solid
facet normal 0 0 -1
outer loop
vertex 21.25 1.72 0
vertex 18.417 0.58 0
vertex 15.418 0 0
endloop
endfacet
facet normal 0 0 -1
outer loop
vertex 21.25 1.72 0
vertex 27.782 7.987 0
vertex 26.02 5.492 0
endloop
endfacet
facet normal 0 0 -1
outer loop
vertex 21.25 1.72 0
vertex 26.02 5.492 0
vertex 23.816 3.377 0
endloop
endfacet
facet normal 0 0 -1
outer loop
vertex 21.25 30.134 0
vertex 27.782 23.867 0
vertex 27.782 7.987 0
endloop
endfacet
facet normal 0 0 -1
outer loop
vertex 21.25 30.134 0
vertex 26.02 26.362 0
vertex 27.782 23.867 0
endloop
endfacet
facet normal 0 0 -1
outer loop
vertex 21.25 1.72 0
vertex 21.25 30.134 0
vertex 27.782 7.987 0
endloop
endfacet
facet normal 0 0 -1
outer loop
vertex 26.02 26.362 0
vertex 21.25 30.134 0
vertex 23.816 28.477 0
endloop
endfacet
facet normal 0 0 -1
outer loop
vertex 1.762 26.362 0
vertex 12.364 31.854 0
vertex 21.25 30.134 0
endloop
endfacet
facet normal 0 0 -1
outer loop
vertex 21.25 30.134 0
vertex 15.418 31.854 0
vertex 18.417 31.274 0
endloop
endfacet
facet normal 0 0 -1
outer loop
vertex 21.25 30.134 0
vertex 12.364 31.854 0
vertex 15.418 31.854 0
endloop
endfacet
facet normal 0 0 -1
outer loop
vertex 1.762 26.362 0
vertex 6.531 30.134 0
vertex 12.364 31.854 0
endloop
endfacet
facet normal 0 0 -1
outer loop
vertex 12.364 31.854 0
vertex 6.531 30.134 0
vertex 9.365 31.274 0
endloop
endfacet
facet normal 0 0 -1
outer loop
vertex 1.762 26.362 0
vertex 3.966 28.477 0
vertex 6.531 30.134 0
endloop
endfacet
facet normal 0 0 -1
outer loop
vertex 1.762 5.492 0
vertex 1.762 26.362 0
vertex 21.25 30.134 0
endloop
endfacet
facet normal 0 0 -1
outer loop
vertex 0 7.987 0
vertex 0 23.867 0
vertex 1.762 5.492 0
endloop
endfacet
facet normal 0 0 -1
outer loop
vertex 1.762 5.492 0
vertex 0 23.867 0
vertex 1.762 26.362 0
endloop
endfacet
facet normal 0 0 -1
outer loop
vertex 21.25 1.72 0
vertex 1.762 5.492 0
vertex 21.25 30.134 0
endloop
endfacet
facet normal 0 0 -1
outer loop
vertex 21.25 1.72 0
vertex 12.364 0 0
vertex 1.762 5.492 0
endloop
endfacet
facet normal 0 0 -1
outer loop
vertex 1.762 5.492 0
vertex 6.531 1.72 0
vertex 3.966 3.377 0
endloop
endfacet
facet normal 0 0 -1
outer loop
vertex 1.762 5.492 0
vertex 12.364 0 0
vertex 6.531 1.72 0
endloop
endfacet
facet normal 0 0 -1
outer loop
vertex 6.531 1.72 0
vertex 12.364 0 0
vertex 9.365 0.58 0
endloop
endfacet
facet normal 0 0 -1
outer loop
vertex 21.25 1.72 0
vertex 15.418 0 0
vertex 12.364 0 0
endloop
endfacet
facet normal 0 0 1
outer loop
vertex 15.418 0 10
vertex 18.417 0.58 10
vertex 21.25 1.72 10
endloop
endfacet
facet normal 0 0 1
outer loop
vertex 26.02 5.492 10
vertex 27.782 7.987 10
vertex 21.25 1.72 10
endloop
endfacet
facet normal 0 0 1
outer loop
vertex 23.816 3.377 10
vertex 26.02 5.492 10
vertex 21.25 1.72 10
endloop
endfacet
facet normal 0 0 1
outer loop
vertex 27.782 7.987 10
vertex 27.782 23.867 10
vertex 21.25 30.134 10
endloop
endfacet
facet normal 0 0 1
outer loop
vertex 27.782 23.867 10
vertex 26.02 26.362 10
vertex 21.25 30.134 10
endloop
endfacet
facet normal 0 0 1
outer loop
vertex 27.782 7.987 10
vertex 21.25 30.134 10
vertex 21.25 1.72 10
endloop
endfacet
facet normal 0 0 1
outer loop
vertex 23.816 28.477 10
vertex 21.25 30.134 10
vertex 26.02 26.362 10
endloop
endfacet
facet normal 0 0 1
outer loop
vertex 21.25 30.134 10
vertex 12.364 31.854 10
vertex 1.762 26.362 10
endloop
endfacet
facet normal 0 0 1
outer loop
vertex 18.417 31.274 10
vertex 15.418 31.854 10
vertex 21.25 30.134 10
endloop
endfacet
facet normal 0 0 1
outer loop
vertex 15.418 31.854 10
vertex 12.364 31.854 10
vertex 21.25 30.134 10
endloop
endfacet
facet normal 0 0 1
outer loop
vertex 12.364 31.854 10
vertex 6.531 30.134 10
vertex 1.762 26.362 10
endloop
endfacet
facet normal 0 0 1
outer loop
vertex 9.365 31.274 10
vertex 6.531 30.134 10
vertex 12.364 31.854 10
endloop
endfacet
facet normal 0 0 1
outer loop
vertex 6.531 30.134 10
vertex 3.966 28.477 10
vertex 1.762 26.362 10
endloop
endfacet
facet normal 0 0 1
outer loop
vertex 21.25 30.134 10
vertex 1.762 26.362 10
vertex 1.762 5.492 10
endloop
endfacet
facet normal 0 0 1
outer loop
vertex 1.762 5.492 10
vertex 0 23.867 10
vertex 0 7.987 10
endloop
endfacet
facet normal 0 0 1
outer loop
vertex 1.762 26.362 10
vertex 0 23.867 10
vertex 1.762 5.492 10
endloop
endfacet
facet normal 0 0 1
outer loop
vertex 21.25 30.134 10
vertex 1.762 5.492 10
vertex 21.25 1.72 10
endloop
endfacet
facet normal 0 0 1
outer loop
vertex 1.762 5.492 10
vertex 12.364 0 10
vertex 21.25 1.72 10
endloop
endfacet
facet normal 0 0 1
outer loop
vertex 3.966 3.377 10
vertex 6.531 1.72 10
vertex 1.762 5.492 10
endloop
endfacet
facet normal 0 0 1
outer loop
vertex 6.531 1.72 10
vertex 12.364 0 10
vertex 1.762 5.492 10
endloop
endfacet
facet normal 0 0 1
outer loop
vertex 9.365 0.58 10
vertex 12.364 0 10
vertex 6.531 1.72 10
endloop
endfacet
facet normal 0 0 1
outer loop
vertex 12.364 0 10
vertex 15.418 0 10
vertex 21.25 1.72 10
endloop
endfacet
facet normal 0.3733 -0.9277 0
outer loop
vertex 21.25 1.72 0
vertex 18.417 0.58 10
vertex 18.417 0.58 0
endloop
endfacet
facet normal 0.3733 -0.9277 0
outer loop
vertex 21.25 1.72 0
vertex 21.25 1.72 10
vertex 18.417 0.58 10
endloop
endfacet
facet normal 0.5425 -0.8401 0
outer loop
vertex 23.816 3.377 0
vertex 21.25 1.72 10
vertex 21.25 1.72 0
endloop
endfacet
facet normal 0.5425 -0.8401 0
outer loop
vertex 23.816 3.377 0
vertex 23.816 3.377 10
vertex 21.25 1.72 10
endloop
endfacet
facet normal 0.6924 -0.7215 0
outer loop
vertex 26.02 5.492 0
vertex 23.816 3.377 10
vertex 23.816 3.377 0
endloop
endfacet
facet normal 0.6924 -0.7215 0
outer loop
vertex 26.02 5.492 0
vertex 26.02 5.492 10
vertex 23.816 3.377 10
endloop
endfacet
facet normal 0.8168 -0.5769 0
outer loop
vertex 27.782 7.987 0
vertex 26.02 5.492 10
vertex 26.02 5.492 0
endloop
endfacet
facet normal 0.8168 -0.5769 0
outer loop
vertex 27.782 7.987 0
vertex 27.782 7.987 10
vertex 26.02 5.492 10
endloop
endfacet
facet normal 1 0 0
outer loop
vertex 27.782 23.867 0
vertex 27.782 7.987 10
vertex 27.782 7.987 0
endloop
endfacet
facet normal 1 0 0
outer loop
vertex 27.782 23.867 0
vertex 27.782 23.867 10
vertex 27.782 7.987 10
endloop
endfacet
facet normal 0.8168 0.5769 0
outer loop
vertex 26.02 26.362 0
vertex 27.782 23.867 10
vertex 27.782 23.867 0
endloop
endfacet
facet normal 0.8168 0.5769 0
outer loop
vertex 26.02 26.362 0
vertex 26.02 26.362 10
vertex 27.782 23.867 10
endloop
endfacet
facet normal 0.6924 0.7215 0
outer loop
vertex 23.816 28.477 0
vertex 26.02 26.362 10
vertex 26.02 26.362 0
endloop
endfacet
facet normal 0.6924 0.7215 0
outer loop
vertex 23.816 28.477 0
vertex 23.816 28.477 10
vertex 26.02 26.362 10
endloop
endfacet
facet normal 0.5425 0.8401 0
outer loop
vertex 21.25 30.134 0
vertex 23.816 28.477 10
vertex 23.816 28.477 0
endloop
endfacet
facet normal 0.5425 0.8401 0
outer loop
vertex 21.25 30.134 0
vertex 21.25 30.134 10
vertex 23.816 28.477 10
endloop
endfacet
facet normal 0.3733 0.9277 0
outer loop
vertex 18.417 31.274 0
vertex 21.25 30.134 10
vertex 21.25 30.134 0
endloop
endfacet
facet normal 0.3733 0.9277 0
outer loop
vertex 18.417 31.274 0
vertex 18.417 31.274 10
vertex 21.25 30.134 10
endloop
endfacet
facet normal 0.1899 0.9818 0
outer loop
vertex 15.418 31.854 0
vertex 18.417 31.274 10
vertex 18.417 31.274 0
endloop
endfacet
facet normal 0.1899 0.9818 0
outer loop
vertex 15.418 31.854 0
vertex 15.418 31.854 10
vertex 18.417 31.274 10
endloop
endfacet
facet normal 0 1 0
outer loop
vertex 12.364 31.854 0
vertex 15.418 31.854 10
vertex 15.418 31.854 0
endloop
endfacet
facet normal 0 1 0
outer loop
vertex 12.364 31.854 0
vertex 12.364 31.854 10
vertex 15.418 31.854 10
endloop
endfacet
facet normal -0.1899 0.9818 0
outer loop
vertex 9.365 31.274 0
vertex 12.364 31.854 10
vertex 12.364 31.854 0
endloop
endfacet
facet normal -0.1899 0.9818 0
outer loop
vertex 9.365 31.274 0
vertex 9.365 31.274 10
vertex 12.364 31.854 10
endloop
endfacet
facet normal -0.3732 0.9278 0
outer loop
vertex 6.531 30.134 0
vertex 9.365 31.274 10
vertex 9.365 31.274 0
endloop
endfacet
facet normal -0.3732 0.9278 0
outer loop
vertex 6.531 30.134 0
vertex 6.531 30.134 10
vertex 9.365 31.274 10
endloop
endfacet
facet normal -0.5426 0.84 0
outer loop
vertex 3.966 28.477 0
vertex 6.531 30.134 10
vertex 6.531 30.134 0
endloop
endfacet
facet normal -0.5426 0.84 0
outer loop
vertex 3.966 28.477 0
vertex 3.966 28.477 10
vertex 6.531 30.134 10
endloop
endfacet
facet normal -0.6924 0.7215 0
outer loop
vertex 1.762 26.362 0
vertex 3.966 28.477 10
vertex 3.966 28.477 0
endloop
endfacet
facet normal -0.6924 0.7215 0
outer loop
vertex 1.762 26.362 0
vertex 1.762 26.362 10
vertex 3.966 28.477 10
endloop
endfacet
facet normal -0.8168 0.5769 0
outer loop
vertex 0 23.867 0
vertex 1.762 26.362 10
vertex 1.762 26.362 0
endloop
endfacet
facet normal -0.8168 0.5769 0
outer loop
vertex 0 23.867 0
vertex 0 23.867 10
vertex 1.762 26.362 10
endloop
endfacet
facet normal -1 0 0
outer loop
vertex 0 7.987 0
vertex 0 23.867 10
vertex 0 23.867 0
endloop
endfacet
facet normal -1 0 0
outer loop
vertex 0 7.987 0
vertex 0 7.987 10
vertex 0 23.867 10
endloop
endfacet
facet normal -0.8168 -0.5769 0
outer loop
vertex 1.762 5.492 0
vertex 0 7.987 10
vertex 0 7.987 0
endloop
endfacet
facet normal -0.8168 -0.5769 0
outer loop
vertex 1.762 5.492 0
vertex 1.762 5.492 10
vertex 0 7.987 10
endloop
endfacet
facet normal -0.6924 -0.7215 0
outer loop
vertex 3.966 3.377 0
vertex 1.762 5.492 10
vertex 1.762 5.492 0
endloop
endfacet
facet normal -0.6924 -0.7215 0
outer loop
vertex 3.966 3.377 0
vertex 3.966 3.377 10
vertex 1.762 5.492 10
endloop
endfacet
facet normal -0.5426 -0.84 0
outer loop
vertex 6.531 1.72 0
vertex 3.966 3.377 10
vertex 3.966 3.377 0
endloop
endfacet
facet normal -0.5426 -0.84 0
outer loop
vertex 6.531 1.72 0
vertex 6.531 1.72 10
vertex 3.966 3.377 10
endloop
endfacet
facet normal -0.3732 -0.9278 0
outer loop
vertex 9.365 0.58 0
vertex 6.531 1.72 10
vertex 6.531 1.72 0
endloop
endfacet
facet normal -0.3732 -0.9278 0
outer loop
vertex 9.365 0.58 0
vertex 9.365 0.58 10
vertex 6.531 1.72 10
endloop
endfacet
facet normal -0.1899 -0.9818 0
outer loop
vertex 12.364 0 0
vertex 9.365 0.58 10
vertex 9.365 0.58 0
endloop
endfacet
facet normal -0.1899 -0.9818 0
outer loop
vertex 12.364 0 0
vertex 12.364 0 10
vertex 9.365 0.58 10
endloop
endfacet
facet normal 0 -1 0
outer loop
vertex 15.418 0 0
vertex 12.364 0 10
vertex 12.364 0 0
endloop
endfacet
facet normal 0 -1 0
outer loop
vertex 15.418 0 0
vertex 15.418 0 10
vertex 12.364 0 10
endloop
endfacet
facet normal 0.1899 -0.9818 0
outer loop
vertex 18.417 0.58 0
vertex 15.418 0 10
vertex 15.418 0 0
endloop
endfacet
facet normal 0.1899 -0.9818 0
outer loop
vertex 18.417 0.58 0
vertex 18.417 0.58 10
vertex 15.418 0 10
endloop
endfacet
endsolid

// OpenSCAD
$fn = 32;

// ----------------------------------------------------------------------
// Flat adaptor: double_d, 10 mm thick
// ----------------------------------------------------------------------

// --- parameters (mm) ---
profile_height = 10;      // extrusion height
profile_points = 24;      // points of the closed outline

profile = [[27.782, 23.867], [26.02, 26.362], [23.816, 28.477], [21.25, 30.134], [18.417, 31.274], [15.418, 31.854], [12.364, 31.854], [9.365, 31.274], [6.531, 30.134], [3.966, 28.477], [1.762, 26.362], [0, 23.867], [0, 7.987], [1.762, 5.492], [3.966, 3.377], [6.531, 1.72], [9.365, 0.58], [12.364, 0], [15.418, 0], [18.417, 0.58], [21.25, 1.72], [23.816, 3.377], [26.02, 5.492], [27.782, 7.987]];  // single closed polygon, 24 points, counter clockwise

// --- the one profile operation ---
linear_extrude(height = profile_height) polygon(points = profile);
